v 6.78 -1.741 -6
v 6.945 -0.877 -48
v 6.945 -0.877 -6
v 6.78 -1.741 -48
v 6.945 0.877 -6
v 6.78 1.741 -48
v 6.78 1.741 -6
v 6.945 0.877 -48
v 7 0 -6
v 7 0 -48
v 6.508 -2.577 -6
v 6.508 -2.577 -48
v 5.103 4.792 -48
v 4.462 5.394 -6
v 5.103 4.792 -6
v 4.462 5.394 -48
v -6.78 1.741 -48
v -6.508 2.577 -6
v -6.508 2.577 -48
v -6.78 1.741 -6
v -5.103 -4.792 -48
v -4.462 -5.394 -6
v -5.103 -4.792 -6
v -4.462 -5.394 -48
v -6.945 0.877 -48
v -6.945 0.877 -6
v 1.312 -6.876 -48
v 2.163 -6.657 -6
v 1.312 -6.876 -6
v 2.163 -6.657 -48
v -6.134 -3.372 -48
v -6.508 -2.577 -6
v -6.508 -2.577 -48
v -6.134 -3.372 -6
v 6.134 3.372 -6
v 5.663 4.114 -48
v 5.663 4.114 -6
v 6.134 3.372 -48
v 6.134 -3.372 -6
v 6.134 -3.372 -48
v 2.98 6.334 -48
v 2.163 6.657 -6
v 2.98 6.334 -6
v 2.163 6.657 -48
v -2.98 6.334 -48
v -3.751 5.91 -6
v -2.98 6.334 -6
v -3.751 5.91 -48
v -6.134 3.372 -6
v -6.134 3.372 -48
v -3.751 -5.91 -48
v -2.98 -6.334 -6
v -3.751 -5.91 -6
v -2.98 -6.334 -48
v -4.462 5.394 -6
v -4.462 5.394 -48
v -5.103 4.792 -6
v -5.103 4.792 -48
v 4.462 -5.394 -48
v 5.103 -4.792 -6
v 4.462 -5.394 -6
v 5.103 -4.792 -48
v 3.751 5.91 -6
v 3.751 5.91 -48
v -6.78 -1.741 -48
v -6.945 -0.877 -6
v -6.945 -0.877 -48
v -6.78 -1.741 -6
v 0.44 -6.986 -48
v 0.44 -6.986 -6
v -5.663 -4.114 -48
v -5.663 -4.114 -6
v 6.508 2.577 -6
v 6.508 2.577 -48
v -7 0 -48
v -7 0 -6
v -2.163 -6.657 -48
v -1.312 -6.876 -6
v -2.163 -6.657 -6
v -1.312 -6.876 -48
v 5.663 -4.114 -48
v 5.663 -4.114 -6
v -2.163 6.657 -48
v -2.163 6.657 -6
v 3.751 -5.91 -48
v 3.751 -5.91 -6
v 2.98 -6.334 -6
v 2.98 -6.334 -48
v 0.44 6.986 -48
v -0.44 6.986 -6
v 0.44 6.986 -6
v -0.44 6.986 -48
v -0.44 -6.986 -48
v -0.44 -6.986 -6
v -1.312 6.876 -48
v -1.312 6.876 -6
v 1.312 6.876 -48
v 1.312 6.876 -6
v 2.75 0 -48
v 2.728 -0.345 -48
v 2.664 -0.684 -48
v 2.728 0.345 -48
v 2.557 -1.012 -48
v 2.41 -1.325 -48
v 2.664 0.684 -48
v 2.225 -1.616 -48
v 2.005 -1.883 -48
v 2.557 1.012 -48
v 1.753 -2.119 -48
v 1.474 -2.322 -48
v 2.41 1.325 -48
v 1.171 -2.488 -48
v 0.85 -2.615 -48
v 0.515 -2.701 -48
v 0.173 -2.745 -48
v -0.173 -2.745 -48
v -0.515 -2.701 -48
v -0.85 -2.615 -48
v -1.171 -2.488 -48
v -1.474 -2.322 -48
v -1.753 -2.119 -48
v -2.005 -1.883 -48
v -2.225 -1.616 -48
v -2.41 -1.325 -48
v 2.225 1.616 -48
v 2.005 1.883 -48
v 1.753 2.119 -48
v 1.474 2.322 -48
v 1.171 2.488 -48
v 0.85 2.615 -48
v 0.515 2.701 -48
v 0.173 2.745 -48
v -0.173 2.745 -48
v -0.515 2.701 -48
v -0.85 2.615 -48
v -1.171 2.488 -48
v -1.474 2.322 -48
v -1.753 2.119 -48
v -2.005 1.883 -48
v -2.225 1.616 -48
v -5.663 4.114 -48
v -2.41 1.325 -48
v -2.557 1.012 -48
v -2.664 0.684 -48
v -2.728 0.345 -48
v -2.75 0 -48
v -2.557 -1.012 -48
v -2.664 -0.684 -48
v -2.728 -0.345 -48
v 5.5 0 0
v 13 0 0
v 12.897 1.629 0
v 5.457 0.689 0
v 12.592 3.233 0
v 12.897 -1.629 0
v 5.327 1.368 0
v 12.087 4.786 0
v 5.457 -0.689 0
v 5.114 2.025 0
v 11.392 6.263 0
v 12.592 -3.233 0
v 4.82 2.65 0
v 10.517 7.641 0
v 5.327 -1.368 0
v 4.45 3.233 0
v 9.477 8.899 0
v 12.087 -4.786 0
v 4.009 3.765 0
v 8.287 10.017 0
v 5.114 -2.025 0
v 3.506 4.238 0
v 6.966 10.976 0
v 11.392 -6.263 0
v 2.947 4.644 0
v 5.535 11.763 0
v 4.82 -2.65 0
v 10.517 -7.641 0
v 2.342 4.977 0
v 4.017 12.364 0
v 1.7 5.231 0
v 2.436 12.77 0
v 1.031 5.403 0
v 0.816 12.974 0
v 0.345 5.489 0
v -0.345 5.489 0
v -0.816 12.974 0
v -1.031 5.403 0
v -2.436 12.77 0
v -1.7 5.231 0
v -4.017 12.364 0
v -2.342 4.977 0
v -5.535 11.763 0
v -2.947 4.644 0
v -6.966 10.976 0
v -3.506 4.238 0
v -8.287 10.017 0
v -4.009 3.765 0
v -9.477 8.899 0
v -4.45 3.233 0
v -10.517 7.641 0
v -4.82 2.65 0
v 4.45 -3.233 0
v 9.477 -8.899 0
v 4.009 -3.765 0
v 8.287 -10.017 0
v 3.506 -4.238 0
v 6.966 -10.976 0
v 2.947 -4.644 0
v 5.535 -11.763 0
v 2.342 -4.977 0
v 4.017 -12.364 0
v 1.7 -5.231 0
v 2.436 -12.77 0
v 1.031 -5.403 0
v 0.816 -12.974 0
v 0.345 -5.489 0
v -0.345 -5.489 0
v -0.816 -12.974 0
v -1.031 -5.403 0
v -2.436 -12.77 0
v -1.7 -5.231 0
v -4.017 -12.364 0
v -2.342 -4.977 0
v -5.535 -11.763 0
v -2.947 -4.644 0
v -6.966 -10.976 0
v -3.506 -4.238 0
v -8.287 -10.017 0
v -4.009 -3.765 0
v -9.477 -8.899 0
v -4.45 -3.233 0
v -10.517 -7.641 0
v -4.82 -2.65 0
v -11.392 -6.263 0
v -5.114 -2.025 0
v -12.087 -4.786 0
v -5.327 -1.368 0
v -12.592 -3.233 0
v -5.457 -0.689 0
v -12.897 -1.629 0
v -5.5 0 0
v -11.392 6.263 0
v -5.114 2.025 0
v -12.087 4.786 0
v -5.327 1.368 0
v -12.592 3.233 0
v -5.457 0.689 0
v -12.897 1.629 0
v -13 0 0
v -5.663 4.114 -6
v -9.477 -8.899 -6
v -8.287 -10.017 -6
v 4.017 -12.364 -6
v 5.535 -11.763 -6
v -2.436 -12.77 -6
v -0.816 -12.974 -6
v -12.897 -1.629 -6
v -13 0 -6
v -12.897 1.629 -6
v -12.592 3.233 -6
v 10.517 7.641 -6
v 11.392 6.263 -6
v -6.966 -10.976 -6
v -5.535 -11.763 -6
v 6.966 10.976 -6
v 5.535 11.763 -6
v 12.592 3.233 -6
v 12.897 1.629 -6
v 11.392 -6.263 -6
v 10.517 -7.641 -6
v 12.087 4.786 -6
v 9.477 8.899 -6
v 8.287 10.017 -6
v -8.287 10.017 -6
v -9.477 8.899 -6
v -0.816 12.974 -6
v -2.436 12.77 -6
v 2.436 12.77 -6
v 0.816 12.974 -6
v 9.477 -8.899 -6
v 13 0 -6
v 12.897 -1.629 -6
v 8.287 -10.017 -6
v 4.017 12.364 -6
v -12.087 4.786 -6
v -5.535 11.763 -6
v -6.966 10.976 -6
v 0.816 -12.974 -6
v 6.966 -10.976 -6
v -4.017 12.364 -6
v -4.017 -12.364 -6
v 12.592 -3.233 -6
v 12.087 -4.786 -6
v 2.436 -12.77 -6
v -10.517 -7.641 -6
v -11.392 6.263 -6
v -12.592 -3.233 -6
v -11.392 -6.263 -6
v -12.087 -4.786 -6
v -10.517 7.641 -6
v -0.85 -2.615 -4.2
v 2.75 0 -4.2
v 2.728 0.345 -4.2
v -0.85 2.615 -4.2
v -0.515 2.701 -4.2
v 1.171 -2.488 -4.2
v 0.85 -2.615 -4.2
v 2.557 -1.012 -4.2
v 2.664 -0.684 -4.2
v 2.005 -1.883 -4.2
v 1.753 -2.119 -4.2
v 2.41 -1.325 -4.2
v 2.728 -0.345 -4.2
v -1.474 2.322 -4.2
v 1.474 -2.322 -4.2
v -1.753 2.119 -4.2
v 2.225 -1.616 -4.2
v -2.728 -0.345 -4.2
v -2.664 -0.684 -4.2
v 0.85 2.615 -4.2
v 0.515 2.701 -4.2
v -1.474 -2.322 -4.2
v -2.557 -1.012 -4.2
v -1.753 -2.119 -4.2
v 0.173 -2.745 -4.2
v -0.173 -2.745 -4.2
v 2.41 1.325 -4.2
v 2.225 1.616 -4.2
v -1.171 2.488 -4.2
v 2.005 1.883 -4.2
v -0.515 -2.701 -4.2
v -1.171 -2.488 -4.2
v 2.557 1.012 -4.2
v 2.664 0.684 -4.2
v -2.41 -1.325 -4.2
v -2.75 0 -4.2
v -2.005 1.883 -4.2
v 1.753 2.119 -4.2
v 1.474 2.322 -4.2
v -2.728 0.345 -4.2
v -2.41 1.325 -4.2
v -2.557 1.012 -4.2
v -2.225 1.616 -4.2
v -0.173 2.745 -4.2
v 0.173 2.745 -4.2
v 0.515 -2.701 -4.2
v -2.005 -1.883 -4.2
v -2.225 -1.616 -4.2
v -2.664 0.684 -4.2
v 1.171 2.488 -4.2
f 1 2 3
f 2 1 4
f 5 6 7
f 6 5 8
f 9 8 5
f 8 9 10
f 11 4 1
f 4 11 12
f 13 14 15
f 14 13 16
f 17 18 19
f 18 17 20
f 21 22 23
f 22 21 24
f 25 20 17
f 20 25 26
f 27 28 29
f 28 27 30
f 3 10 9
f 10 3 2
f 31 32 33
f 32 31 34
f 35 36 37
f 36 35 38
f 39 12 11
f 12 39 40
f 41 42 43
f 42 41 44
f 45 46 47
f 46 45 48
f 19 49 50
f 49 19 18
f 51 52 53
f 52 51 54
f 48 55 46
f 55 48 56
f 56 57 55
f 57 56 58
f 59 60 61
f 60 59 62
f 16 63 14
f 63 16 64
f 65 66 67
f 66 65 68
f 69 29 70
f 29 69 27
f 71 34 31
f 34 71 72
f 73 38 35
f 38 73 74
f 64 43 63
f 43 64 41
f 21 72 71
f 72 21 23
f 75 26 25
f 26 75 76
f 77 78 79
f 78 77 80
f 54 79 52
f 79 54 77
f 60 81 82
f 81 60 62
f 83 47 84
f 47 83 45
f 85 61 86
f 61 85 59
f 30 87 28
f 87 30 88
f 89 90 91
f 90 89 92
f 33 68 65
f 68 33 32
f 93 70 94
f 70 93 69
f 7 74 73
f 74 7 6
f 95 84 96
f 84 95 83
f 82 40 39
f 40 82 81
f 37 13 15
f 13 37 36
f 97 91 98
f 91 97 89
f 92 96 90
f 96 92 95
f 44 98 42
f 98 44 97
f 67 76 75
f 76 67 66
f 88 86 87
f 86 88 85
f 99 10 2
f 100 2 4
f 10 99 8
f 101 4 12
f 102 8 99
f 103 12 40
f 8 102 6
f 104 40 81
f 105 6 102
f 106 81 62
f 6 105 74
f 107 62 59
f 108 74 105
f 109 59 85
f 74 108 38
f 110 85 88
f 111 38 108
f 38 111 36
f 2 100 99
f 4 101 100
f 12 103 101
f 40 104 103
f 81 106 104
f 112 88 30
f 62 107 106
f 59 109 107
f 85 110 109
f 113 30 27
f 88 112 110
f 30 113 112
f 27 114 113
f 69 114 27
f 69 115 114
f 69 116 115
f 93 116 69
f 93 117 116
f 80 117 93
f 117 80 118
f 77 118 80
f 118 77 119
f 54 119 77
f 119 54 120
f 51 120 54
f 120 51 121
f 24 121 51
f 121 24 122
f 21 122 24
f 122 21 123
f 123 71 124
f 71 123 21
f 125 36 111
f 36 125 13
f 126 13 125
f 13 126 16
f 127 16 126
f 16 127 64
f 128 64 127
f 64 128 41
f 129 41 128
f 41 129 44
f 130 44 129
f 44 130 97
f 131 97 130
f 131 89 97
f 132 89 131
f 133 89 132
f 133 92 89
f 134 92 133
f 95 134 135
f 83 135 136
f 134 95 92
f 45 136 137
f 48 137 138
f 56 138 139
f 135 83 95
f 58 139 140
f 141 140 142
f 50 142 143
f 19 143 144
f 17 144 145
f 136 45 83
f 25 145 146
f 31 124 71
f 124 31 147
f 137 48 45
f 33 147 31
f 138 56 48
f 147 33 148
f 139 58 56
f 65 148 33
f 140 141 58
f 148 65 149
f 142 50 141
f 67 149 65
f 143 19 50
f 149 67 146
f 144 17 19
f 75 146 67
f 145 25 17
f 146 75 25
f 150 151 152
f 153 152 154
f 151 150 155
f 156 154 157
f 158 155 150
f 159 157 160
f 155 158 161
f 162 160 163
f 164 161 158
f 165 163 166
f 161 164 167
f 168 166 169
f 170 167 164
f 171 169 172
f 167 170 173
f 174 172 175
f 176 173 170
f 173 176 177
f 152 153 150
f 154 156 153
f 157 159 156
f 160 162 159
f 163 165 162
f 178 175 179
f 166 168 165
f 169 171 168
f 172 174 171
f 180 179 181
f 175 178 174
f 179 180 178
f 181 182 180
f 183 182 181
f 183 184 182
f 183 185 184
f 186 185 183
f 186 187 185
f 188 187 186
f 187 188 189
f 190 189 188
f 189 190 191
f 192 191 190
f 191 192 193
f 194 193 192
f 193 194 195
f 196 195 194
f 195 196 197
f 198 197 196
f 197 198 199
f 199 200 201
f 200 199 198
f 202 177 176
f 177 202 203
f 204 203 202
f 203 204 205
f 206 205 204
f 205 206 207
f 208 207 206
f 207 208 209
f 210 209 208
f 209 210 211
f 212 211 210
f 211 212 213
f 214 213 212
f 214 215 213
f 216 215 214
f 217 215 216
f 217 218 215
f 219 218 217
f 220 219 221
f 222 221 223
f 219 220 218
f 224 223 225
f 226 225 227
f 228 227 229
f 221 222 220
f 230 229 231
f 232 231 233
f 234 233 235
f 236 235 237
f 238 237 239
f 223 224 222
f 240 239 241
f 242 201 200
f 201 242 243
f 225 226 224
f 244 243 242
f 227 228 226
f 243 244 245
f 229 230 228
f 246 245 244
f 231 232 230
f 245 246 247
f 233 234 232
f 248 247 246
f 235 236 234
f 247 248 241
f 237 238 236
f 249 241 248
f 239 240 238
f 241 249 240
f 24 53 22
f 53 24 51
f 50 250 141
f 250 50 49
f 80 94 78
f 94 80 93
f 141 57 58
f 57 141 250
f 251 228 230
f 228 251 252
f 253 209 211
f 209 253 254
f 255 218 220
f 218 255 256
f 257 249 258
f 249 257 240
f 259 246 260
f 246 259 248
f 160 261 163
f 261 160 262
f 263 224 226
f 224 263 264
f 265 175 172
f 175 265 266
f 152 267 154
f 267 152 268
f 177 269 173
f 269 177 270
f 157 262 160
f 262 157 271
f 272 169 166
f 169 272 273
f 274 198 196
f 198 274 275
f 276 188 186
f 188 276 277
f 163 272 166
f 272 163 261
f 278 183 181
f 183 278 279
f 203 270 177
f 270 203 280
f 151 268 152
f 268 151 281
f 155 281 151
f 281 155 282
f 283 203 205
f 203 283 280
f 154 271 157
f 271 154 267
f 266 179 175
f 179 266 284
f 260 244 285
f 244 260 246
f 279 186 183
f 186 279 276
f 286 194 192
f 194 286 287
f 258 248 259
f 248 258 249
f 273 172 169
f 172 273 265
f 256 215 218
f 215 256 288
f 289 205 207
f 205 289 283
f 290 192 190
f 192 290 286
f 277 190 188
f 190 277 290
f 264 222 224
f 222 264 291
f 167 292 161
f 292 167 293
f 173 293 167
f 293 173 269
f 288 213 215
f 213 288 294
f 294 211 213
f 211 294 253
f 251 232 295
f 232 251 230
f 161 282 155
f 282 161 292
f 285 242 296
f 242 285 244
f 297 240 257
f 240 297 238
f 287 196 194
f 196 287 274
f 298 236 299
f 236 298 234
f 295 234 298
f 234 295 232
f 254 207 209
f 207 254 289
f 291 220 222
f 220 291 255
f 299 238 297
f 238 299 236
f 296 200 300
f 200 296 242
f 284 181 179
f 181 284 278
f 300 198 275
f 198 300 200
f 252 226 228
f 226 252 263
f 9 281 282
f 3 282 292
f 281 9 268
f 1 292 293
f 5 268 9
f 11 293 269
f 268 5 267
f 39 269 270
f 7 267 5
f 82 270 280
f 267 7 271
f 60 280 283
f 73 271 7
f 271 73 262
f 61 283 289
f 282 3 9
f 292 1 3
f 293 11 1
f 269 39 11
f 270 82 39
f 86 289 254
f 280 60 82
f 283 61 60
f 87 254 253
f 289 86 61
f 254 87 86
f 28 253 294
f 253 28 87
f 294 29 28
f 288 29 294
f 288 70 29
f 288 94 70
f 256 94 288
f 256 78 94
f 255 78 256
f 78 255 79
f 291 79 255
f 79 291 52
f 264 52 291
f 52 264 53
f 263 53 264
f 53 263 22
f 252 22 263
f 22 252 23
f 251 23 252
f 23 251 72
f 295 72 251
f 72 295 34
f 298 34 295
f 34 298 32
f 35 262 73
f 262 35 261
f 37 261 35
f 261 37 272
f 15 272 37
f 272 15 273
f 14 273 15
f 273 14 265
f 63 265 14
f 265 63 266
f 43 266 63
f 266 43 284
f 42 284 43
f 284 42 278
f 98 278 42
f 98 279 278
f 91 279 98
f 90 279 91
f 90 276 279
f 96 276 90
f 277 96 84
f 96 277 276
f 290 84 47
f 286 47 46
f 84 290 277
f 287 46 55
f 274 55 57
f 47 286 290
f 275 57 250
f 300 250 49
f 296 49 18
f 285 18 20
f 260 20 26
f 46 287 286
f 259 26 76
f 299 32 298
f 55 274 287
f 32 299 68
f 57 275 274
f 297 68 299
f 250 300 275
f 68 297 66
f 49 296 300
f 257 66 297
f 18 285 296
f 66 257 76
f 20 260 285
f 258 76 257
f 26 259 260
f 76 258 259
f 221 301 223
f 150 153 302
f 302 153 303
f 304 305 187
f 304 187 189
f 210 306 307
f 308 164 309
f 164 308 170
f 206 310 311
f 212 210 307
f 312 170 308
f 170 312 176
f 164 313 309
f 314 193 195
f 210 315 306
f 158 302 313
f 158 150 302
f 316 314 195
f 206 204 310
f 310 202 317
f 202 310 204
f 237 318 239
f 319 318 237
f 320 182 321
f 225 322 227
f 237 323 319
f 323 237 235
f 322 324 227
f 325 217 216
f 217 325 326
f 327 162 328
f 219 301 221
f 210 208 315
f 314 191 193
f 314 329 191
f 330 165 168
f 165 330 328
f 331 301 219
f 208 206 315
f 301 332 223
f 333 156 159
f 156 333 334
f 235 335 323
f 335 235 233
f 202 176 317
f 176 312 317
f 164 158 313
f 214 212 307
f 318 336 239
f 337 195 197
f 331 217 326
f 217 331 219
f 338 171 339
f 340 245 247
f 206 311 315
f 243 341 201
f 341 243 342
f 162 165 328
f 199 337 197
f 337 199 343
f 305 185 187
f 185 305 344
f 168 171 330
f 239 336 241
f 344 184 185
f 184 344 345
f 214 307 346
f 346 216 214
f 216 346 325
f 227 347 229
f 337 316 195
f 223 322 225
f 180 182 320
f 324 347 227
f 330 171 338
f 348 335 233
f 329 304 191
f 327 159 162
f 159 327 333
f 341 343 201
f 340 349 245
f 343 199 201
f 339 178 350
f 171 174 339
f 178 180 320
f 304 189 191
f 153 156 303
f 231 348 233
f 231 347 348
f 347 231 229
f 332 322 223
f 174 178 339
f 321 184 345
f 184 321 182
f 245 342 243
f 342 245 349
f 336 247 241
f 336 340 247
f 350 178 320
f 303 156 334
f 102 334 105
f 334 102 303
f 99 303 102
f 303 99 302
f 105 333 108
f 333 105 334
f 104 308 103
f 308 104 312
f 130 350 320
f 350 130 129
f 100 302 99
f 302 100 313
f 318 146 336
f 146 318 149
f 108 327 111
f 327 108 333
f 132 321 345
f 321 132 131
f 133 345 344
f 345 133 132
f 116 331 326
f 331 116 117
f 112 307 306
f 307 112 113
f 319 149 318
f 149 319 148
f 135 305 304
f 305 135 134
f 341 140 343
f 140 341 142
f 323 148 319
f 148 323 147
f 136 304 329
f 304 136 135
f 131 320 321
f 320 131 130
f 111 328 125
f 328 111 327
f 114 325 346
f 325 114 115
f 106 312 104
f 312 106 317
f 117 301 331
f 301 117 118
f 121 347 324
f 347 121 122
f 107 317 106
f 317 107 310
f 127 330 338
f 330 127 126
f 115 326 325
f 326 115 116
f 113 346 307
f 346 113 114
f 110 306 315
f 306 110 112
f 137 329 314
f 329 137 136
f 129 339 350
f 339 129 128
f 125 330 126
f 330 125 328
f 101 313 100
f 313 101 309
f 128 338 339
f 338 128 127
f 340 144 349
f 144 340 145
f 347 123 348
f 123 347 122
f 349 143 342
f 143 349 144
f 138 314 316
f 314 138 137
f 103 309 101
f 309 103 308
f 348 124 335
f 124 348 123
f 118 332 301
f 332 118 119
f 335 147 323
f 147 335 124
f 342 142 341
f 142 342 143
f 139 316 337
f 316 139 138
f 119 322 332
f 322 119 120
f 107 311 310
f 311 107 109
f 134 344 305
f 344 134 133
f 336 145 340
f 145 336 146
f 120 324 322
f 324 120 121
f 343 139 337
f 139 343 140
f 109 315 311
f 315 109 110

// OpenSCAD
$fn = 50;


difference() {
	union() {
		translate(v = [0, 0, -48.0000000000]) {
			cylinder(h = 48, r = 7.0000000000);
		}
		translate(v = [0, 0, -6.0000000000]) {
			cylinder(h = 6, r = 13.0000000000);
		}
	}
	union() {
		translate(v = [0, 0, 0]) {
			rotate(a = [0, 0, 0]) {
				difference() {
					union() {
						#translate(v = [0, 0, -48.0000000000]) {
							cylinder(h = 48, r = 2.2500000000);
						}
						#translate(v = [0, 0, -4.2000000000]) {
							cylinder(h = 4.2000000000, r = 7.0000000000, r1 = 2.7500000000, r2 = 5.5000000000);
						}
						#translate(v = [0, 0, -48.0000000000]) {
							cylinder(h = 48, r = 2.7500000000);
						}
						#translate(v = [0, 0, -48.0000000000]) {
							cylinder(h = 48, r = 2.2500000000);
						}
					}
					union();
				}
			}
		}
	}
}
